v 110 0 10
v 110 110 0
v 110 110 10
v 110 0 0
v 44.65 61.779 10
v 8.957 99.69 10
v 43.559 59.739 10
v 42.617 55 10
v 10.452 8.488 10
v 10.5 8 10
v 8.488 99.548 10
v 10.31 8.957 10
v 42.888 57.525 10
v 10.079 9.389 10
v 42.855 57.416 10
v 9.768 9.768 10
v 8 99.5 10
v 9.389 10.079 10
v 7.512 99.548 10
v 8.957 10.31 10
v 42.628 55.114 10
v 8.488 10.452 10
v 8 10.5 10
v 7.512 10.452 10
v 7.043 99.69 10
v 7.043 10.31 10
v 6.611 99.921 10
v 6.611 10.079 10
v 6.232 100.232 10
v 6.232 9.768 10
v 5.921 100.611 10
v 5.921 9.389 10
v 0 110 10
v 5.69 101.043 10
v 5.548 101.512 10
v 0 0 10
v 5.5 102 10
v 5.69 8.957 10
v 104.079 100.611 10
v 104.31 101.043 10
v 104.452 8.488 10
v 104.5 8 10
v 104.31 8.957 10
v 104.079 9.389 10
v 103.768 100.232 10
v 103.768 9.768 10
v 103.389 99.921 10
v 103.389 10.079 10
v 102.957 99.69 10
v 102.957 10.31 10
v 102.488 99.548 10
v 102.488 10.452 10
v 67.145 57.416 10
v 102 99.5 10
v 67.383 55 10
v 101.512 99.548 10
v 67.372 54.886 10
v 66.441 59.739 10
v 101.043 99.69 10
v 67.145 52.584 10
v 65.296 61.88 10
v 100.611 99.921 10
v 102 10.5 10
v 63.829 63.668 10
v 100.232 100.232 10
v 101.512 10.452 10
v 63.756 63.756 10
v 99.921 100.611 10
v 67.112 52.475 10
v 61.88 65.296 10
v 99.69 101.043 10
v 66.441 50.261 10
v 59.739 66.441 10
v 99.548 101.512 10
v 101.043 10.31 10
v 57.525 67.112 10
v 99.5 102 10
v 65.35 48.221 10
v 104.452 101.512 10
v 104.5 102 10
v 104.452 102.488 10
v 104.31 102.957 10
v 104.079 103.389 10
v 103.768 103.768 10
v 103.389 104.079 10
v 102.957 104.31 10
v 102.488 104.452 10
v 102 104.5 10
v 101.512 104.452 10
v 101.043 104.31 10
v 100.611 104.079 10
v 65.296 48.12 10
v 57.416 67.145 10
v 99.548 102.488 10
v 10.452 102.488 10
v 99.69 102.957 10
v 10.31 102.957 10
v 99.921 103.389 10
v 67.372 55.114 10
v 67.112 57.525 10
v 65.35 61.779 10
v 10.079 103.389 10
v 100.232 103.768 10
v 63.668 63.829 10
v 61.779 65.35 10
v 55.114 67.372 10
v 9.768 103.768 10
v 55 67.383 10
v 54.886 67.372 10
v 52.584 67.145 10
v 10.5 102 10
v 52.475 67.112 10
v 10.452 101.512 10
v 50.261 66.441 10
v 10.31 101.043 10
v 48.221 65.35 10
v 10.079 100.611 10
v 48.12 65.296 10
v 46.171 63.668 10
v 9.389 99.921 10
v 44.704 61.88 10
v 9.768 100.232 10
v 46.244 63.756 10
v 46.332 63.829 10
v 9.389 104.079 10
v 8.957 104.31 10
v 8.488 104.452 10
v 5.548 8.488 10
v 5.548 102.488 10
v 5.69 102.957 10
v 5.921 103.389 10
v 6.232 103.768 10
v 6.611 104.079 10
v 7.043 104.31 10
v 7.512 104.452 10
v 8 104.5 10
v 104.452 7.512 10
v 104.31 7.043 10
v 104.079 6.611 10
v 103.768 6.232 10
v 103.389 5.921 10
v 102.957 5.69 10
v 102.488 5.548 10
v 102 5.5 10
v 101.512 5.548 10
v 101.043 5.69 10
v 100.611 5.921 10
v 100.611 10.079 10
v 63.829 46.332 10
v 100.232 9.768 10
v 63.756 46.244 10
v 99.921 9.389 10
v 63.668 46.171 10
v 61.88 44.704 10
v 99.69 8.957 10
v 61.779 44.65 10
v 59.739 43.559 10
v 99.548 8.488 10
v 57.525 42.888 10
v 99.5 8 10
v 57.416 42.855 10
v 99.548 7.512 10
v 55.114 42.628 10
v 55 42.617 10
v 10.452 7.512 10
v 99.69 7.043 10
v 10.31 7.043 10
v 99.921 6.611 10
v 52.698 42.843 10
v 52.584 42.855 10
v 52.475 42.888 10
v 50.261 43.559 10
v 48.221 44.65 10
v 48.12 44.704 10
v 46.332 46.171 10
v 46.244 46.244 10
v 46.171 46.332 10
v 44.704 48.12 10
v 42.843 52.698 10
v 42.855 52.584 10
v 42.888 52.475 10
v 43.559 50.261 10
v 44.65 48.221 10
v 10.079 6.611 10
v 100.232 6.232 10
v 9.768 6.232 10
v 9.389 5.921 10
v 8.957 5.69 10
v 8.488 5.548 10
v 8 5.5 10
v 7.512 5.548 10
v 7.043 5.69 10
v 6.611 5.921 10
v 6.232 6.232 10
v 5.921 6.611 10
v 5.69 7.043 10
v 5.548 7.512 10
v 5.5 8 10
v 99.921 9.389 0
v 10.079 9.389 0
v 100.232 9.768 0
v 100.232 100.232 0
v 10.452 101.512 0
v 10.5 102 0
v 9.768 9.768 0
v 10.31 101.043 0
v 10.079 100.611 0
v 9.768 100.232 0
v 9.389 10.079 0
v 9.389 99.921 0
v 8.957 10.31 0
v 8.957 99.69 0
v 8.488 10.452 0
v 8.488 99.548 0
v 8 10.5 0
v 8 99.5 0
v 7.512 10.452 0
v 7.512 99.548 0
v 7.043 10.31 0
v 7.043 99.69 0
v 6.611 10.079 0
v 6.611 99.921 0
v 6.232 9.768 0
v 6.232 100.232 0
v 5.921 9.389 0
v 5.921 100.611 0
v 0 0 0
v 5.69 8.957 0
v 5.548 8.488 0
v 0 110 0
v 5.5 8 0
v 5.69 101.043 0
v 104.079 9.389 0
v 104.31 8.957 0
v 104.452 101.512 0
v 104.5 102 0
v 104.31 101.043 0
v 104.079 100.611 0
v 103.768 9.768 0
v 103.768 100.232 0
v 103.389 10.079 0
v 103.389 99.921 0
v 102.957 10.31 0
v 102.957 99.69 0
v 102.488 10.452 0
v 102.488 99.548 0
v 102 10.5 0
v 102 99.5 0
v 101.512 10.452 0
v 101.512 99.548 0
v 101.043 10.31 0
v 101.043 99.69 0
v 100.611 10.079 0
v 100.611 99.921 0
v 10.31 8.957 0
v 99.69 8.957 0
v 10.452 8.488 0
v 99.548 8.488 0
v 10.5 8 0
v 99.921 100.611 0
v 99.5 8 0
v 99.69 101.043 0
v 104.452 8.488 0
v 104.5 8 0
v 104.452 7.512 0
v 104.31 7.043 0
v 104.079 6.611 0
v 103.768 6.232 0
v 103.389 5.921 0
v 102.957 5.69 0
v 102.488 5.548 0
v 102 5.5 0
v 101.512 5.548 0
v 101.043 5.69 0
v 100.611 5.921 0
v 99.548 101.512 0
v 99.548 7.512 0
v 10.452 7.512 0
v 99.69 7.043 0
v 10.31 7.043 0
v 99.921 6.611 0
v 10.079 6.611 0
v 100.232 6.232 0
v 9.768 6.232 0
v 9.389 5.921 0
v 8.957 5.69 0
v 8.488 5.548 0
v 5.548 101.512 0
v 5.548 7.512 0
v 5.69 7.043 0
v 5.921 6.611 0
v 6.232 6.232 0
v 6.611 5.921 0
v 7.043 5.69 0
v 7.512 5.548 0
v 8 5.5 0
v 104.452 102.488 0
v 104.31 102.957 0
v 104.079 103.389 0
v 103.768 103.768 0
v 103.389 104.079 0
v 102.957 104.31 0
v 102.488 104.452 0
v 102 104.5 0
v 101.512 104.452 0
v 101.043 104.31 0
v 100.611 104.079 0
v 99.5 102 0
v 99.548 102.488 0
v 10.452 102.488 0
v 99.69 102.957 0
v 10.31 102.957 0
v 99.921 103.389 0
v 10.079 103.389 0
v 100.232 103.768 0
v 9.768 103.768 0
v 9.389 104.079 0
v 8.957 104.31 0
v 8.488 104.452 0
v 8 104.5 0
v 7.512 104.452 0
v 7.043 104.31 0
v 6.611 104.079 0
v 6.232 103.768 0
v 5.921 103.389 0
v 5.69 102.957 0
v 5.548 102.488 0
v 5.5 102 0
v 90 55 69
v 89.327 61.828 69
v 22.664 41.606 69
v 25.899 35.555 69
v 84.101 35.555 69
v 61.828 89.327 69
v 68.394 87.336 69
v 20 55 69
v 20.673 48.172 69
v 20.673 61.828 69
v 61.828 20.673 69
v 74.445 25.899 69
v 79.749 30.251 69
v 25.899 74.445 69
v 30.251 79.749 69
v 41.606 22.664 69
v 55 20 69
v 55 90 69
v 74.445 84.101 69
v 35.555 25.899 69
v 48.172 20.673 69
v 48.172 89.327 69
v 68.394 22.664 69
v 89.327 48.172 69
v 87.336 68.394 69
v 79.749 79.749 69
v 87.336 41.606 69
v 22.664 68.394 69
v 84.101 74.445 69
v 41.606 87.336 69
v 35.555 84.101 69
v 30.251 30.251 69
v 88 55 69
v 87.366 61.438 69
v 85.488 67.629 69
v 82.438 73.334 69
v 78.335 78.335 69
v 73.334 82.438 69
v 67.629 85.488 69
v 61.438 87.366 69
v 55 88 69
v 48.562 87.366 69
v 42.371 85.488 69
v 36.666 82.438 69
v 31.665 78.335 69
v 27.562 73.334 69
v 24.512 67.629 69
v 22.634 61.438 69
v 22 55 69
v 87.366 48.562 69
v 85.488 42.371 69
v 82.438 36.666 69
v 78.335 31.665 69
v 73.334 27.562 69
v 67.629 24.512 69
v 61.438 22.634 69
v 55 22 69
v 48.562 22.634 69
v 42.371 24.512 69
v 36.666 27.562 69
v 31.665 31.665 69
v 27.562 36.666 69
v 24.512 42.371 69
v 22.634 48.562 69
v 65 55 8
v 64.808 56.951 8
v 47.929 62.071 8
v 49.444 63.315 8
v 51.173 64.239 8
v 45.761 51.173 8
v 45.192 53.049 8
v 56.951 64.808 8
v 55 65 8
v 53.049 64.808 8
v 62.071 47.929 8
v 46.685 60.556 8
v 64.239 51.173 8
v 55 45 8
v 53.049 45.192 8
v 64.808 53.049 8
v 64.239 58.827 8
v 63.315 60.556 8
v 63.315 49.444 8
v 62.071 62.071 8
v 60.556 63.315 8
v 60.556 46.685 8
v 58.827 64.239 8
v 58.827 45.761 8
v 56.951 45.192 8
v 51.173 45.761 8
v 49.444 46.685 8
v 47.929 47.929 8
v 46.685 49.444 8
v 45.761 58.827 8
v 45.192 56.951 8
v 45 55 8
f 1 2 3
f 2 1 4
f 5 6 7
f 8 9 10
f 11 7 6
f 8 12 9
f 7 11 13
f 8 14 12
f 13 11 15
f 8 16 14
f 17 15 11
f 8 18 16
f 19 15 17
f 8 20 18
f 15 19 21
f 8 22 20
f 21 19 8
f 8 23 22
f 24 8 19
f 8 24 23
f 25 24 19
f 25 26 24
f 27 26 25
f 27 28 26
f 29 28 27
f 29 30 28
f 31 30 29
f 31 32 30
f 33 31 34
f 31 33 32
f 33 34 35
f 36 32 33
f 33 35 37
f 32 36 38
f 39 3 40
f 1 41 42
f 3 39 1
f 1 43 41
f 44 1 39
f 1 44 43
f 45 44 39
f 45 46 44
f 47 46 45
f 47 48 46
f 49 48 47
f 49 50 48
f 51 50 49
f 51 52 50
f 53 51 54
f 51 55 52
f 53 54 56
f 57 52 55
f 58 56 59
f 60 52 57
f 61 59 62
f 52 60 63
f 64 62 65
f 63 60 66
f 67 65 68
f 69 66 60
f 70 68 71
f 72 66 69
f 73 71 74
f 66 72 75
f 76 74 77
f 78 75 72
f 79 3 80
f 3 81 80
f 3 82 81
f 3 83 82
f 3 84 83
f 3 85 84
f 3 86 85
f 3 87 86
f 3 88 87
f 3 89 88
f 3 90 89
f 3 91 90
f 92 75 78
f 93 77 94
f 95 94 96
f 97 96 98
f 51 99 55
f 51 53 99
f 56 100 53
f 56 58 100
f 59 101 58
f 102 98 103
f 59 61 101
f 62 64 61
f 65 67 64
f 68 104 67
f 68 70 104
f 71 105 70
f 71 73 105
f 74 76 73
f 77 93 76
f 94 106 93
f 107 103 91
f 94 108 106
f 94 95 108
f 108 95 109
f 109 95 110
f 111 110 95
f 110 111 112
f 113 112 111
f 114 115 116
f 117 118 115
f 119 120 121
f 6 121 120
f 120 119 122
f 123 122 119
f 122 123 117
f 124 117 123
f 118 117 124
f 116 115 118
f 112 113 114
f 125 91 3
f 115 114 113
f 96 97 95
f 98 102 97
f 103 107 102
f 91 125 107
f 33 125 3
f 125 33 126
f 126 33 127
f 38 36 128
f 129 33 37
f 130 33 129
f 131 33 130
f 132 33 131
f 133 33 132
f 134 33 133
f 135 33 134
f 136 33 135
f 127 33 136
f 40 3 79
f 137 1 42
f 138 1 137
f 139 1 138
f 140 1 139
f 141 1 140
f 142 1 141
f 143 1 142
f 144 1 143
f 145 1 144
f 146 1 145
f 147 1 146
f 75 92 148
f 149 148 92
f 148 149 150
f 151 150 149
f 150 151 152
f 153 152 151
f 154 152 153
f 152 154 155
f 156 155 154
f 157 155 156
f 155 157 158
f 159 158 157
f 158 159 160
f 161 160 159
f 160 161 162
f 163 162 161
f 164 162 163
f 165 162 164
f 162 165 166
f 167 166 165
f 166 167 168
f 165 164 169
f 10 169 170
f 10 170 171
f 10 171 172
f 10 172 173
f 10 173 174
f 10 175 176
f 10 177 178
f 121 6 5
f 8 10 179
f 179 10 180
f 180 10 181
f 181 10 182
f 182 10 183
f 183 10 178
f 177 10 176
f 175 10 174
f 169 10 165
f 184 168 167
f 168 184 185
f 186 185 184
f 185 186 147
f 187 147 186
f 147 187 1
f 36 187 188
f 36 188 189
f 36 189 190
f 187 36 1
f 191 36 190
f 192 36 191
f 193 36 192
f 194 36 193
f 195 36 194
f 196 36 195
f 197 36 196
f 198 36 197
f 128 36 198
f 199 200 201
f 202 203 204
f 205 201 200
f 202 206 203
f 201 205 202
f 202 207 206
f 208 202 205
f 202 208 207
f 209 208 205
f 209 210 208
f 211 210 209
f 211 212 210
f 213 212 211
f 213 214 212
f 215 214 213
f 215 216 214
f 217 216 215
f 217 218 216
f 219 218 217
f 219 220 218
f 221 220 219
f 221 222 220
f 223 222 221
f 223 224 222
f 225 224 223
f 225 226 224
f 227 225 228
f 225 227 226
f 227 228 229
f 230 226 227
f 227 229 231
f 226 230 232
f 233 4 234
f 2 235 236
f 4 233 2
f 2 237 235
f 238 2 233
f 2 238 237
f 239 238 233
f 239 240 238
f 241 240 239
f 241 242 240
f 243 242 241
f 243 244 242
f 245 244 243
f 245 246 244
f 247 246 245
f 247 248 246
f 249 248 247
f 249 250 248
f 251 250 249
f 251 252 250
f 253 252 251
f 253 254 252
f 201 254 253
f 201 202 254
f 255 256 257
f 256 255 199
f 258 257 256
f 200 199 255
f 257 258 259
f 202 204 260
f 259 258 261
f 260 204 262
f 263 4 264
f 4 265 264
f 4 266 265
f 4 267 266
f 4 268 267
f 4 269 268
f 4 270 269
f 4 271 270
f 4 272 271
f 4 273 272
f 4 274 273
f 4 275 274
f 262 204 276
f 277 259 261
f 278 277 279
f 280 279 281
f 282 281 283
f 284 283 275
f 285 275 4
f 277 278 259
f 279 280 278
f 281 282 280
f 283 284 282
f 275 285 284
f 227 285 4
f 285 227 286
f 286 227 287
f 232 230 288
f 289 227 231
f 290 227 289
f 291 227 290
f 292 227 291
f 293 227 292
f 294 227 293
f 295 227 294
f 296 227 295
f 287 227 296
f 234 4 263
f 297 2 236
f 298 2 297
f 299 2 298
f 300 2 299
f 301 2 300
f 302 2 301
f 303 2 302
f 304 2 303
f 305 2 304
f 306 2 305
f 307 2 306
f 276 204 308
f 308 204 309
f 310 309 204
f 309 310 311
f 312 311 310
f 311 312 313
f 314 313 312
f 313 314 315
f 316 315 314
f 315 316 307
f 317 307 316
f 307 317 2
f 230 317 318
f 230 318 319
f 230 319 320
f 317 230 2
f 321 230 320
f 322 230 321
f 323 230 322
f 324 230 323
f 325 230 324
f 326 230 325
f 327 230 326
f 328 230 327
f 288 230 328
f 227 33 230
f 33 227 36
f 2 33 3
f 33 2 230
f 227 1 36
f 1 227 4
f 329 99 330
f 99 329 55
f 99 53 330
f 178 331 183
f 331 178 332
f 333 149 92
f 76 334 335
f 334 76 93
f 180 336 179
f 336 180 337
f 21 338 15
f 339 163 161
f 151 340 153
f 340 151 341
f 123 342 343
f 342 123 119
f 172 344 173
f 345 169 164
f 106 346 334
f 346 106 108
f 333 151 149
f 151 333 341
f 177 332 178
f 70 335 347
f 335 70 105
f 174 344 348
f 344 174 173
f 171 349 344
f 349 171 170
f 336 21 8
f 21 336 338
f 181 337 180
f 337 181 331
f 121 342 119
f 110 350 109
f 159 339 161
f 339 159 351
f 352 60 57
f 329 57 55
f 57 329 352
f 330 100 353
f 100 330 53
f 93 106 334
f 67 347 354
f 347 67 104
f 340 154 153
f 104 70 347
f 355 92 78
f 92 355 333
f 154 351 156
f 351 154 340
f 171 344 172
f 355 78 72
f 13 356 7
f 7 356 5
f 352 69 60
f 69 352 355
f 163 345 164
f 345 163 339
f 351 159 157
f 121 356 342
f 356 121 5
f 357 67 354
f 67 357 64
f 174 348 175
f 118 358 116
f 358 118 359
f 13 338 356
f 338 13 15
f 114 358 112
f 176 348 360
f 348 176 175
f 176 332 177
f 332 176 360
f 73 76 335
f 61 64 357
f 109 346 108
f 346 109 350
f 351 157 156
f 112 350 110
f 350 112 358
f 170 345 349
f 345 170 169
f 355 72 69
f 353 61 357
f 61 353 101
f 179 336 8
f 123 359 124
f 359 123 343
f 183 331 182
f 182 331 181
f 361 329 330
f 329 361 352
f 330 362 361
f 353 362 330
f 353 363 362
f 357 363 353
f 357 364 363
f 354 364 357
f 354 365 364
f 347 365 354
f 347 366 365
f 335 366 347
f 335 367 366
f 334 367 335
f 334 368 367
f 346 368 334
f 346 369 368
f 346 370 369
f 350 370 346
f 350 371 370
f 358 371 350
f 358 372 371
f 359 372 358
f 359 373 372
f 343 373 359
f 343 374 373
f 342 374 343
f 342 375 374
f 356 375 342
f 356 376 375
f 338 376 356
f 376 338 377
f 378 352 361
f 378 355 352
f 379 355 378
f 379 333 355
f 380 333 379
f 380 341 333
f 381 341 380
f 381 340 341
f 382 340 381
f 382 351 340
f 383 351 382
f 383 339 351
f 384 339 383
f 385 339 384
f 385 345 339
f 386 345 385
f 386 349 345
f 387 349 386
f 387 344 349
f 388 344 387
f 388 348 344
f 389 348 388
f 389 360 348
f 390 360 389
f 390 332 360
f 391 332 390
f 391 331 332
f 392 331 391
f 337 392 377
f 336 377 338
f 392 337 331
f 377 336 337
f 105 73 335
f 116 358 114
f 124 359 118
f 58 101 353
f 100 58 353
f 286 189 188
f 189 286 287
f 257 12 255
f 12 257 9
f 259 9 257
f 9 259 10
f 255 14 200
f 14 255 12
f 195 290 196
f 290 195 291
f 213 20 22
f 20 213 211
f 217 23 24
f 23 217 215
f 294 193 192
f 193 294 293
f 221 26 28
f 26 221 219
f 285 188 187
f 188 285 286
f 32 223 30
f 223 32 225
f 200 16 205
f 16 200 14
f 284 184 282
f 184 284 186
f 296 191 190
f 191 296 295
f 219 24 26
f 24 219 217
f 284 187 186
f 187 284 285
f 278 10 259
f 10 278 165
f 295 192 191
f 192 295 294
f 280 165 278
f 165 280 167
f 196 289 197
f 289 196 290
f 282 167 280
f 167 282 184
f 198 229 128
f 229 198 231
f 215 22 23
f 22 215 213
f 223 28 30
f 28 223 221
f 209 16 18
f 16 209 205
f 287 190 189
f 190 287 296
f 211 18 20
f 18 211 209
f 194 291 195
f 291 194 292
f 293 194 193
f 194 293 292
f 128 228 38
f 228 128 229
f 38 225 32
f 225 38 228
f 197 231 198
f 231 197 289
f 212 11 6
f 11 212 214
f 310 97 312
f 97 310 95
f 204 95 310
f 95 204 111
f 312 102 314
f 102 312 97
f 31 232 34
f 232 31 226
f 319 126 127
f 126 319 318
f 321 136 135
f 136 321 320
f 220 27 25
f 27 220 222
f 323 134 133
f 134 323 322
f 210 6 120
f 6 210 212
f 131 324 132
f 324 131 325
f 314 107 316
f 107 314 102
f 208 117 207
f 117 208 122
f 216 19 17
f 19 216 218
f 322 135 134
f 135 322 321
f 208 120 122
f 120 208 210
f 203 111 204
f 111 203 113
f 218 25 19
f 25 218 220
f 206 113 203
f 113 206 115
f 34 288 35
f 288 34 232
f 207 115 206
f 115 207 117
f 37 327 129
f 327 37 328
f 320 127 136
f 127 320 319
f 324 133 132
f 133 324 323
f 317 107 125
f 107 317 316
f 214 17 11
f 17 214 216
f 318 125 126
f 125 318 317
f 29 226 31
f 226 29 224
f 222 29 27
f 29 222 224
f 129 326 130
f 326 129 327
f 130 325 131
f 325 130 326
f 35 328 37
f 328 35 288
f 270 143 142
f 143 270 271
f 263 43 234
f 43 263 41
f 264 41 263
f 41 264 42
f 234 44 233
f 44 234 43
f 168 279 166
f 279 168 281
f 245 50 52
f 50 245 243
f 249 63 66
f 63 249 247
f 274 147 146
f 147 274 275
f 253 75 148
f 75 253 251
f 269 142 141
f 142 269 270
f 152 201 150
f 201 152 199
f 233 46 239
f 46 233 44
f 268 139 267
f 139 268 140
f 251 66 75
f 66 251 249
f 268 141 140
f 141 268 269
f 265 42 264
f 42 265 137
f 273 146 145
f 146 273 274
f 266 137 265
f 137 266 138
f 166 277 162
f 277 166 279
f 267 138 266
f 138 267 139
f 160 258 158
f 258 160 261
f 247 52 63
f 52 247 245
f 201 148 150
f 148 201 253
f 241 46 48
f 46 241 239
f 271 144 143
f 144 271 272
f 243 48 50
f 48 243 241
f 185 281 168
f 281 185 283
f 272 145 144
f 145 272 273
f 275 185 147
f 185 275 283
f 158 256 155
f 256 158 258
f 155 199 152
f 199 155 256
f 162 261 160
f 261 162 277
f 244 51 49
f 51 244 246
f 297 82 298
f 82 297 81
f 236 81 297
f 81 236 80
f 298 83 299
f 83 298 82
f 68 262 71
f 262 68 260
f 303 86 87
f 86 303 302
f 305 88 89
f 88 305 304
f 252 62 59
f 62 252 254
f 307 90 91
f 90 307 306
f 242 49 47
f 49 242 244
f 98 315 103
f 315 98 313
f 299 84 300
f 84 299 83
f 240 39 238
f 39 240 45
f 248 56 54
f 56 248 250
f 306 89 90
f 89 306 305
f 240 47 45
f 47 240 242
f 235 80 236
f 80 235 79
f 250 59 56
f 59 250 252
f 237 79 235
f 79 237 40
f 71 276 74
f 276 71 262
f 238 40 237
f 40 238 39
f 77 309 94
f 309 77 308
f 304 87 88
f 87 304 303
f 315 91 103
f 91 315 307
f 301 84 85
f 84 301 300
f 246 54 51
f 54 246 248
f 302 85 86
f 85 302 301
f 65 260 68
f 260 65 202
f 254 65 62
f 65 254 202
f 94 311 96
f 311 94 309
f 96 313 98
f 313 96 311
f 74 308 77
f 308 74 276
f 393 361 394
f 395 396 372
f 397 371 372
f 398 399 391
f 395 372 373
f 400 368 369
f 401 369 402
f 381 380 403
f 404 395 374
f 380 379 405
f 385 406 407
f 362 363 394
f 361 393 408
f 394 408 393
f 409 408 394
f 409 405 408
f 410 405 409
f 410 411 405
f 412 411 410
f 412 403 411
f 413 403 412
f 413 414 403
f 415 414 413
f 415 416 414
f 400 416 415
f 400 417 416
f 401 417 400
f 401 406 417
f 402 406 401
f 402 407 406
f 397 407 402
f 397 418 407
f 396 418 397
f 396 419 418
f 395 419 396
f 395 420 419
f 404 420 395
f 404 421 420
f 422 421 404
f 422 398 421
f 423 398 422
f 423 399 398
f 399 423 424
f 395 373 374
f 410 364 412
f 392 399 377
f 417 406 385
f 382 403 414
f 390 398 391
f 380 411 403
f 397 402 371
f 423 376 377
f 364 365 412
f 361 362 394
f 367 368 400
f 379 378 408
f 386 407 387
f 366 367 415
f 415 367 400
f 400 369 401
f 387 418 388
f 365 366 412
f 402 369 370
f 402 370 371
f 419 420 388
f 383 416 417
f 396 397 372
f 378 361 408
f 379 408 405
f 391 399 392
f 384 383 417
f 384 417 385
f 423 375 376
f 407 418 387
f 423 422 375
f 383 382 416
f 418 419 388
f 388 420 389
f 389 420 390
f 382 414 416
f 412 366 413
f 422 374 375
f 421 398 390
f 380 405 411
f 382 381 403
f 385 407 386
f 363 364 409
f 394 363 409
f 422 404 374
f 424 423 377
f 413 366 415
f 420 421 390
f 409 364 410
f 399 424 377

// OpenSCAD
$fn = 32;

// ----------------------------------------------------------------------
// Hopper: flanged with square flange
// ----------------------------------------------------------------------

// --- parameters (mm) ---
fl = 110;                 // flange side, X and Y
fl_t = 10;                // flange thickness
cone_h = 60;              // cone height above the flange
top_d = 70;               // cone mouth diameter
bot_d = 24;               // cone spout diameter
wall = 2;                 // cone wall thickness
hole_r = 2.5;             // flange hole radius
hole_in = 8;              // hole inset from the corners

bore_d = bot_d - 2 * wall;  // spout bore diameter
total_h = fl_t + cone_h - 1;  // overall height

difference() {
  union() {
    cube([fl, fl, fl_t]);
    translate([fl / 2, fl / 2, fl_t - 1])
      cylinder(h = cone_h, d1 = bot_d, d2 = top_d);
  }
  translate([fl / 2, fl / 2, fl_t - 2])
    cylinder(h = cone_h + 1, d1 = bore_d, d2 = top_d - 2 * wall);
  for (sx = [0, 1], sy = [0, 1])
    translate([sx ? fl - hole_in : hole_in,
               sy ? fl - hole_in : hole_in, -1])
      cylinder(r = hole_r, h = fl_t + 2);
}
